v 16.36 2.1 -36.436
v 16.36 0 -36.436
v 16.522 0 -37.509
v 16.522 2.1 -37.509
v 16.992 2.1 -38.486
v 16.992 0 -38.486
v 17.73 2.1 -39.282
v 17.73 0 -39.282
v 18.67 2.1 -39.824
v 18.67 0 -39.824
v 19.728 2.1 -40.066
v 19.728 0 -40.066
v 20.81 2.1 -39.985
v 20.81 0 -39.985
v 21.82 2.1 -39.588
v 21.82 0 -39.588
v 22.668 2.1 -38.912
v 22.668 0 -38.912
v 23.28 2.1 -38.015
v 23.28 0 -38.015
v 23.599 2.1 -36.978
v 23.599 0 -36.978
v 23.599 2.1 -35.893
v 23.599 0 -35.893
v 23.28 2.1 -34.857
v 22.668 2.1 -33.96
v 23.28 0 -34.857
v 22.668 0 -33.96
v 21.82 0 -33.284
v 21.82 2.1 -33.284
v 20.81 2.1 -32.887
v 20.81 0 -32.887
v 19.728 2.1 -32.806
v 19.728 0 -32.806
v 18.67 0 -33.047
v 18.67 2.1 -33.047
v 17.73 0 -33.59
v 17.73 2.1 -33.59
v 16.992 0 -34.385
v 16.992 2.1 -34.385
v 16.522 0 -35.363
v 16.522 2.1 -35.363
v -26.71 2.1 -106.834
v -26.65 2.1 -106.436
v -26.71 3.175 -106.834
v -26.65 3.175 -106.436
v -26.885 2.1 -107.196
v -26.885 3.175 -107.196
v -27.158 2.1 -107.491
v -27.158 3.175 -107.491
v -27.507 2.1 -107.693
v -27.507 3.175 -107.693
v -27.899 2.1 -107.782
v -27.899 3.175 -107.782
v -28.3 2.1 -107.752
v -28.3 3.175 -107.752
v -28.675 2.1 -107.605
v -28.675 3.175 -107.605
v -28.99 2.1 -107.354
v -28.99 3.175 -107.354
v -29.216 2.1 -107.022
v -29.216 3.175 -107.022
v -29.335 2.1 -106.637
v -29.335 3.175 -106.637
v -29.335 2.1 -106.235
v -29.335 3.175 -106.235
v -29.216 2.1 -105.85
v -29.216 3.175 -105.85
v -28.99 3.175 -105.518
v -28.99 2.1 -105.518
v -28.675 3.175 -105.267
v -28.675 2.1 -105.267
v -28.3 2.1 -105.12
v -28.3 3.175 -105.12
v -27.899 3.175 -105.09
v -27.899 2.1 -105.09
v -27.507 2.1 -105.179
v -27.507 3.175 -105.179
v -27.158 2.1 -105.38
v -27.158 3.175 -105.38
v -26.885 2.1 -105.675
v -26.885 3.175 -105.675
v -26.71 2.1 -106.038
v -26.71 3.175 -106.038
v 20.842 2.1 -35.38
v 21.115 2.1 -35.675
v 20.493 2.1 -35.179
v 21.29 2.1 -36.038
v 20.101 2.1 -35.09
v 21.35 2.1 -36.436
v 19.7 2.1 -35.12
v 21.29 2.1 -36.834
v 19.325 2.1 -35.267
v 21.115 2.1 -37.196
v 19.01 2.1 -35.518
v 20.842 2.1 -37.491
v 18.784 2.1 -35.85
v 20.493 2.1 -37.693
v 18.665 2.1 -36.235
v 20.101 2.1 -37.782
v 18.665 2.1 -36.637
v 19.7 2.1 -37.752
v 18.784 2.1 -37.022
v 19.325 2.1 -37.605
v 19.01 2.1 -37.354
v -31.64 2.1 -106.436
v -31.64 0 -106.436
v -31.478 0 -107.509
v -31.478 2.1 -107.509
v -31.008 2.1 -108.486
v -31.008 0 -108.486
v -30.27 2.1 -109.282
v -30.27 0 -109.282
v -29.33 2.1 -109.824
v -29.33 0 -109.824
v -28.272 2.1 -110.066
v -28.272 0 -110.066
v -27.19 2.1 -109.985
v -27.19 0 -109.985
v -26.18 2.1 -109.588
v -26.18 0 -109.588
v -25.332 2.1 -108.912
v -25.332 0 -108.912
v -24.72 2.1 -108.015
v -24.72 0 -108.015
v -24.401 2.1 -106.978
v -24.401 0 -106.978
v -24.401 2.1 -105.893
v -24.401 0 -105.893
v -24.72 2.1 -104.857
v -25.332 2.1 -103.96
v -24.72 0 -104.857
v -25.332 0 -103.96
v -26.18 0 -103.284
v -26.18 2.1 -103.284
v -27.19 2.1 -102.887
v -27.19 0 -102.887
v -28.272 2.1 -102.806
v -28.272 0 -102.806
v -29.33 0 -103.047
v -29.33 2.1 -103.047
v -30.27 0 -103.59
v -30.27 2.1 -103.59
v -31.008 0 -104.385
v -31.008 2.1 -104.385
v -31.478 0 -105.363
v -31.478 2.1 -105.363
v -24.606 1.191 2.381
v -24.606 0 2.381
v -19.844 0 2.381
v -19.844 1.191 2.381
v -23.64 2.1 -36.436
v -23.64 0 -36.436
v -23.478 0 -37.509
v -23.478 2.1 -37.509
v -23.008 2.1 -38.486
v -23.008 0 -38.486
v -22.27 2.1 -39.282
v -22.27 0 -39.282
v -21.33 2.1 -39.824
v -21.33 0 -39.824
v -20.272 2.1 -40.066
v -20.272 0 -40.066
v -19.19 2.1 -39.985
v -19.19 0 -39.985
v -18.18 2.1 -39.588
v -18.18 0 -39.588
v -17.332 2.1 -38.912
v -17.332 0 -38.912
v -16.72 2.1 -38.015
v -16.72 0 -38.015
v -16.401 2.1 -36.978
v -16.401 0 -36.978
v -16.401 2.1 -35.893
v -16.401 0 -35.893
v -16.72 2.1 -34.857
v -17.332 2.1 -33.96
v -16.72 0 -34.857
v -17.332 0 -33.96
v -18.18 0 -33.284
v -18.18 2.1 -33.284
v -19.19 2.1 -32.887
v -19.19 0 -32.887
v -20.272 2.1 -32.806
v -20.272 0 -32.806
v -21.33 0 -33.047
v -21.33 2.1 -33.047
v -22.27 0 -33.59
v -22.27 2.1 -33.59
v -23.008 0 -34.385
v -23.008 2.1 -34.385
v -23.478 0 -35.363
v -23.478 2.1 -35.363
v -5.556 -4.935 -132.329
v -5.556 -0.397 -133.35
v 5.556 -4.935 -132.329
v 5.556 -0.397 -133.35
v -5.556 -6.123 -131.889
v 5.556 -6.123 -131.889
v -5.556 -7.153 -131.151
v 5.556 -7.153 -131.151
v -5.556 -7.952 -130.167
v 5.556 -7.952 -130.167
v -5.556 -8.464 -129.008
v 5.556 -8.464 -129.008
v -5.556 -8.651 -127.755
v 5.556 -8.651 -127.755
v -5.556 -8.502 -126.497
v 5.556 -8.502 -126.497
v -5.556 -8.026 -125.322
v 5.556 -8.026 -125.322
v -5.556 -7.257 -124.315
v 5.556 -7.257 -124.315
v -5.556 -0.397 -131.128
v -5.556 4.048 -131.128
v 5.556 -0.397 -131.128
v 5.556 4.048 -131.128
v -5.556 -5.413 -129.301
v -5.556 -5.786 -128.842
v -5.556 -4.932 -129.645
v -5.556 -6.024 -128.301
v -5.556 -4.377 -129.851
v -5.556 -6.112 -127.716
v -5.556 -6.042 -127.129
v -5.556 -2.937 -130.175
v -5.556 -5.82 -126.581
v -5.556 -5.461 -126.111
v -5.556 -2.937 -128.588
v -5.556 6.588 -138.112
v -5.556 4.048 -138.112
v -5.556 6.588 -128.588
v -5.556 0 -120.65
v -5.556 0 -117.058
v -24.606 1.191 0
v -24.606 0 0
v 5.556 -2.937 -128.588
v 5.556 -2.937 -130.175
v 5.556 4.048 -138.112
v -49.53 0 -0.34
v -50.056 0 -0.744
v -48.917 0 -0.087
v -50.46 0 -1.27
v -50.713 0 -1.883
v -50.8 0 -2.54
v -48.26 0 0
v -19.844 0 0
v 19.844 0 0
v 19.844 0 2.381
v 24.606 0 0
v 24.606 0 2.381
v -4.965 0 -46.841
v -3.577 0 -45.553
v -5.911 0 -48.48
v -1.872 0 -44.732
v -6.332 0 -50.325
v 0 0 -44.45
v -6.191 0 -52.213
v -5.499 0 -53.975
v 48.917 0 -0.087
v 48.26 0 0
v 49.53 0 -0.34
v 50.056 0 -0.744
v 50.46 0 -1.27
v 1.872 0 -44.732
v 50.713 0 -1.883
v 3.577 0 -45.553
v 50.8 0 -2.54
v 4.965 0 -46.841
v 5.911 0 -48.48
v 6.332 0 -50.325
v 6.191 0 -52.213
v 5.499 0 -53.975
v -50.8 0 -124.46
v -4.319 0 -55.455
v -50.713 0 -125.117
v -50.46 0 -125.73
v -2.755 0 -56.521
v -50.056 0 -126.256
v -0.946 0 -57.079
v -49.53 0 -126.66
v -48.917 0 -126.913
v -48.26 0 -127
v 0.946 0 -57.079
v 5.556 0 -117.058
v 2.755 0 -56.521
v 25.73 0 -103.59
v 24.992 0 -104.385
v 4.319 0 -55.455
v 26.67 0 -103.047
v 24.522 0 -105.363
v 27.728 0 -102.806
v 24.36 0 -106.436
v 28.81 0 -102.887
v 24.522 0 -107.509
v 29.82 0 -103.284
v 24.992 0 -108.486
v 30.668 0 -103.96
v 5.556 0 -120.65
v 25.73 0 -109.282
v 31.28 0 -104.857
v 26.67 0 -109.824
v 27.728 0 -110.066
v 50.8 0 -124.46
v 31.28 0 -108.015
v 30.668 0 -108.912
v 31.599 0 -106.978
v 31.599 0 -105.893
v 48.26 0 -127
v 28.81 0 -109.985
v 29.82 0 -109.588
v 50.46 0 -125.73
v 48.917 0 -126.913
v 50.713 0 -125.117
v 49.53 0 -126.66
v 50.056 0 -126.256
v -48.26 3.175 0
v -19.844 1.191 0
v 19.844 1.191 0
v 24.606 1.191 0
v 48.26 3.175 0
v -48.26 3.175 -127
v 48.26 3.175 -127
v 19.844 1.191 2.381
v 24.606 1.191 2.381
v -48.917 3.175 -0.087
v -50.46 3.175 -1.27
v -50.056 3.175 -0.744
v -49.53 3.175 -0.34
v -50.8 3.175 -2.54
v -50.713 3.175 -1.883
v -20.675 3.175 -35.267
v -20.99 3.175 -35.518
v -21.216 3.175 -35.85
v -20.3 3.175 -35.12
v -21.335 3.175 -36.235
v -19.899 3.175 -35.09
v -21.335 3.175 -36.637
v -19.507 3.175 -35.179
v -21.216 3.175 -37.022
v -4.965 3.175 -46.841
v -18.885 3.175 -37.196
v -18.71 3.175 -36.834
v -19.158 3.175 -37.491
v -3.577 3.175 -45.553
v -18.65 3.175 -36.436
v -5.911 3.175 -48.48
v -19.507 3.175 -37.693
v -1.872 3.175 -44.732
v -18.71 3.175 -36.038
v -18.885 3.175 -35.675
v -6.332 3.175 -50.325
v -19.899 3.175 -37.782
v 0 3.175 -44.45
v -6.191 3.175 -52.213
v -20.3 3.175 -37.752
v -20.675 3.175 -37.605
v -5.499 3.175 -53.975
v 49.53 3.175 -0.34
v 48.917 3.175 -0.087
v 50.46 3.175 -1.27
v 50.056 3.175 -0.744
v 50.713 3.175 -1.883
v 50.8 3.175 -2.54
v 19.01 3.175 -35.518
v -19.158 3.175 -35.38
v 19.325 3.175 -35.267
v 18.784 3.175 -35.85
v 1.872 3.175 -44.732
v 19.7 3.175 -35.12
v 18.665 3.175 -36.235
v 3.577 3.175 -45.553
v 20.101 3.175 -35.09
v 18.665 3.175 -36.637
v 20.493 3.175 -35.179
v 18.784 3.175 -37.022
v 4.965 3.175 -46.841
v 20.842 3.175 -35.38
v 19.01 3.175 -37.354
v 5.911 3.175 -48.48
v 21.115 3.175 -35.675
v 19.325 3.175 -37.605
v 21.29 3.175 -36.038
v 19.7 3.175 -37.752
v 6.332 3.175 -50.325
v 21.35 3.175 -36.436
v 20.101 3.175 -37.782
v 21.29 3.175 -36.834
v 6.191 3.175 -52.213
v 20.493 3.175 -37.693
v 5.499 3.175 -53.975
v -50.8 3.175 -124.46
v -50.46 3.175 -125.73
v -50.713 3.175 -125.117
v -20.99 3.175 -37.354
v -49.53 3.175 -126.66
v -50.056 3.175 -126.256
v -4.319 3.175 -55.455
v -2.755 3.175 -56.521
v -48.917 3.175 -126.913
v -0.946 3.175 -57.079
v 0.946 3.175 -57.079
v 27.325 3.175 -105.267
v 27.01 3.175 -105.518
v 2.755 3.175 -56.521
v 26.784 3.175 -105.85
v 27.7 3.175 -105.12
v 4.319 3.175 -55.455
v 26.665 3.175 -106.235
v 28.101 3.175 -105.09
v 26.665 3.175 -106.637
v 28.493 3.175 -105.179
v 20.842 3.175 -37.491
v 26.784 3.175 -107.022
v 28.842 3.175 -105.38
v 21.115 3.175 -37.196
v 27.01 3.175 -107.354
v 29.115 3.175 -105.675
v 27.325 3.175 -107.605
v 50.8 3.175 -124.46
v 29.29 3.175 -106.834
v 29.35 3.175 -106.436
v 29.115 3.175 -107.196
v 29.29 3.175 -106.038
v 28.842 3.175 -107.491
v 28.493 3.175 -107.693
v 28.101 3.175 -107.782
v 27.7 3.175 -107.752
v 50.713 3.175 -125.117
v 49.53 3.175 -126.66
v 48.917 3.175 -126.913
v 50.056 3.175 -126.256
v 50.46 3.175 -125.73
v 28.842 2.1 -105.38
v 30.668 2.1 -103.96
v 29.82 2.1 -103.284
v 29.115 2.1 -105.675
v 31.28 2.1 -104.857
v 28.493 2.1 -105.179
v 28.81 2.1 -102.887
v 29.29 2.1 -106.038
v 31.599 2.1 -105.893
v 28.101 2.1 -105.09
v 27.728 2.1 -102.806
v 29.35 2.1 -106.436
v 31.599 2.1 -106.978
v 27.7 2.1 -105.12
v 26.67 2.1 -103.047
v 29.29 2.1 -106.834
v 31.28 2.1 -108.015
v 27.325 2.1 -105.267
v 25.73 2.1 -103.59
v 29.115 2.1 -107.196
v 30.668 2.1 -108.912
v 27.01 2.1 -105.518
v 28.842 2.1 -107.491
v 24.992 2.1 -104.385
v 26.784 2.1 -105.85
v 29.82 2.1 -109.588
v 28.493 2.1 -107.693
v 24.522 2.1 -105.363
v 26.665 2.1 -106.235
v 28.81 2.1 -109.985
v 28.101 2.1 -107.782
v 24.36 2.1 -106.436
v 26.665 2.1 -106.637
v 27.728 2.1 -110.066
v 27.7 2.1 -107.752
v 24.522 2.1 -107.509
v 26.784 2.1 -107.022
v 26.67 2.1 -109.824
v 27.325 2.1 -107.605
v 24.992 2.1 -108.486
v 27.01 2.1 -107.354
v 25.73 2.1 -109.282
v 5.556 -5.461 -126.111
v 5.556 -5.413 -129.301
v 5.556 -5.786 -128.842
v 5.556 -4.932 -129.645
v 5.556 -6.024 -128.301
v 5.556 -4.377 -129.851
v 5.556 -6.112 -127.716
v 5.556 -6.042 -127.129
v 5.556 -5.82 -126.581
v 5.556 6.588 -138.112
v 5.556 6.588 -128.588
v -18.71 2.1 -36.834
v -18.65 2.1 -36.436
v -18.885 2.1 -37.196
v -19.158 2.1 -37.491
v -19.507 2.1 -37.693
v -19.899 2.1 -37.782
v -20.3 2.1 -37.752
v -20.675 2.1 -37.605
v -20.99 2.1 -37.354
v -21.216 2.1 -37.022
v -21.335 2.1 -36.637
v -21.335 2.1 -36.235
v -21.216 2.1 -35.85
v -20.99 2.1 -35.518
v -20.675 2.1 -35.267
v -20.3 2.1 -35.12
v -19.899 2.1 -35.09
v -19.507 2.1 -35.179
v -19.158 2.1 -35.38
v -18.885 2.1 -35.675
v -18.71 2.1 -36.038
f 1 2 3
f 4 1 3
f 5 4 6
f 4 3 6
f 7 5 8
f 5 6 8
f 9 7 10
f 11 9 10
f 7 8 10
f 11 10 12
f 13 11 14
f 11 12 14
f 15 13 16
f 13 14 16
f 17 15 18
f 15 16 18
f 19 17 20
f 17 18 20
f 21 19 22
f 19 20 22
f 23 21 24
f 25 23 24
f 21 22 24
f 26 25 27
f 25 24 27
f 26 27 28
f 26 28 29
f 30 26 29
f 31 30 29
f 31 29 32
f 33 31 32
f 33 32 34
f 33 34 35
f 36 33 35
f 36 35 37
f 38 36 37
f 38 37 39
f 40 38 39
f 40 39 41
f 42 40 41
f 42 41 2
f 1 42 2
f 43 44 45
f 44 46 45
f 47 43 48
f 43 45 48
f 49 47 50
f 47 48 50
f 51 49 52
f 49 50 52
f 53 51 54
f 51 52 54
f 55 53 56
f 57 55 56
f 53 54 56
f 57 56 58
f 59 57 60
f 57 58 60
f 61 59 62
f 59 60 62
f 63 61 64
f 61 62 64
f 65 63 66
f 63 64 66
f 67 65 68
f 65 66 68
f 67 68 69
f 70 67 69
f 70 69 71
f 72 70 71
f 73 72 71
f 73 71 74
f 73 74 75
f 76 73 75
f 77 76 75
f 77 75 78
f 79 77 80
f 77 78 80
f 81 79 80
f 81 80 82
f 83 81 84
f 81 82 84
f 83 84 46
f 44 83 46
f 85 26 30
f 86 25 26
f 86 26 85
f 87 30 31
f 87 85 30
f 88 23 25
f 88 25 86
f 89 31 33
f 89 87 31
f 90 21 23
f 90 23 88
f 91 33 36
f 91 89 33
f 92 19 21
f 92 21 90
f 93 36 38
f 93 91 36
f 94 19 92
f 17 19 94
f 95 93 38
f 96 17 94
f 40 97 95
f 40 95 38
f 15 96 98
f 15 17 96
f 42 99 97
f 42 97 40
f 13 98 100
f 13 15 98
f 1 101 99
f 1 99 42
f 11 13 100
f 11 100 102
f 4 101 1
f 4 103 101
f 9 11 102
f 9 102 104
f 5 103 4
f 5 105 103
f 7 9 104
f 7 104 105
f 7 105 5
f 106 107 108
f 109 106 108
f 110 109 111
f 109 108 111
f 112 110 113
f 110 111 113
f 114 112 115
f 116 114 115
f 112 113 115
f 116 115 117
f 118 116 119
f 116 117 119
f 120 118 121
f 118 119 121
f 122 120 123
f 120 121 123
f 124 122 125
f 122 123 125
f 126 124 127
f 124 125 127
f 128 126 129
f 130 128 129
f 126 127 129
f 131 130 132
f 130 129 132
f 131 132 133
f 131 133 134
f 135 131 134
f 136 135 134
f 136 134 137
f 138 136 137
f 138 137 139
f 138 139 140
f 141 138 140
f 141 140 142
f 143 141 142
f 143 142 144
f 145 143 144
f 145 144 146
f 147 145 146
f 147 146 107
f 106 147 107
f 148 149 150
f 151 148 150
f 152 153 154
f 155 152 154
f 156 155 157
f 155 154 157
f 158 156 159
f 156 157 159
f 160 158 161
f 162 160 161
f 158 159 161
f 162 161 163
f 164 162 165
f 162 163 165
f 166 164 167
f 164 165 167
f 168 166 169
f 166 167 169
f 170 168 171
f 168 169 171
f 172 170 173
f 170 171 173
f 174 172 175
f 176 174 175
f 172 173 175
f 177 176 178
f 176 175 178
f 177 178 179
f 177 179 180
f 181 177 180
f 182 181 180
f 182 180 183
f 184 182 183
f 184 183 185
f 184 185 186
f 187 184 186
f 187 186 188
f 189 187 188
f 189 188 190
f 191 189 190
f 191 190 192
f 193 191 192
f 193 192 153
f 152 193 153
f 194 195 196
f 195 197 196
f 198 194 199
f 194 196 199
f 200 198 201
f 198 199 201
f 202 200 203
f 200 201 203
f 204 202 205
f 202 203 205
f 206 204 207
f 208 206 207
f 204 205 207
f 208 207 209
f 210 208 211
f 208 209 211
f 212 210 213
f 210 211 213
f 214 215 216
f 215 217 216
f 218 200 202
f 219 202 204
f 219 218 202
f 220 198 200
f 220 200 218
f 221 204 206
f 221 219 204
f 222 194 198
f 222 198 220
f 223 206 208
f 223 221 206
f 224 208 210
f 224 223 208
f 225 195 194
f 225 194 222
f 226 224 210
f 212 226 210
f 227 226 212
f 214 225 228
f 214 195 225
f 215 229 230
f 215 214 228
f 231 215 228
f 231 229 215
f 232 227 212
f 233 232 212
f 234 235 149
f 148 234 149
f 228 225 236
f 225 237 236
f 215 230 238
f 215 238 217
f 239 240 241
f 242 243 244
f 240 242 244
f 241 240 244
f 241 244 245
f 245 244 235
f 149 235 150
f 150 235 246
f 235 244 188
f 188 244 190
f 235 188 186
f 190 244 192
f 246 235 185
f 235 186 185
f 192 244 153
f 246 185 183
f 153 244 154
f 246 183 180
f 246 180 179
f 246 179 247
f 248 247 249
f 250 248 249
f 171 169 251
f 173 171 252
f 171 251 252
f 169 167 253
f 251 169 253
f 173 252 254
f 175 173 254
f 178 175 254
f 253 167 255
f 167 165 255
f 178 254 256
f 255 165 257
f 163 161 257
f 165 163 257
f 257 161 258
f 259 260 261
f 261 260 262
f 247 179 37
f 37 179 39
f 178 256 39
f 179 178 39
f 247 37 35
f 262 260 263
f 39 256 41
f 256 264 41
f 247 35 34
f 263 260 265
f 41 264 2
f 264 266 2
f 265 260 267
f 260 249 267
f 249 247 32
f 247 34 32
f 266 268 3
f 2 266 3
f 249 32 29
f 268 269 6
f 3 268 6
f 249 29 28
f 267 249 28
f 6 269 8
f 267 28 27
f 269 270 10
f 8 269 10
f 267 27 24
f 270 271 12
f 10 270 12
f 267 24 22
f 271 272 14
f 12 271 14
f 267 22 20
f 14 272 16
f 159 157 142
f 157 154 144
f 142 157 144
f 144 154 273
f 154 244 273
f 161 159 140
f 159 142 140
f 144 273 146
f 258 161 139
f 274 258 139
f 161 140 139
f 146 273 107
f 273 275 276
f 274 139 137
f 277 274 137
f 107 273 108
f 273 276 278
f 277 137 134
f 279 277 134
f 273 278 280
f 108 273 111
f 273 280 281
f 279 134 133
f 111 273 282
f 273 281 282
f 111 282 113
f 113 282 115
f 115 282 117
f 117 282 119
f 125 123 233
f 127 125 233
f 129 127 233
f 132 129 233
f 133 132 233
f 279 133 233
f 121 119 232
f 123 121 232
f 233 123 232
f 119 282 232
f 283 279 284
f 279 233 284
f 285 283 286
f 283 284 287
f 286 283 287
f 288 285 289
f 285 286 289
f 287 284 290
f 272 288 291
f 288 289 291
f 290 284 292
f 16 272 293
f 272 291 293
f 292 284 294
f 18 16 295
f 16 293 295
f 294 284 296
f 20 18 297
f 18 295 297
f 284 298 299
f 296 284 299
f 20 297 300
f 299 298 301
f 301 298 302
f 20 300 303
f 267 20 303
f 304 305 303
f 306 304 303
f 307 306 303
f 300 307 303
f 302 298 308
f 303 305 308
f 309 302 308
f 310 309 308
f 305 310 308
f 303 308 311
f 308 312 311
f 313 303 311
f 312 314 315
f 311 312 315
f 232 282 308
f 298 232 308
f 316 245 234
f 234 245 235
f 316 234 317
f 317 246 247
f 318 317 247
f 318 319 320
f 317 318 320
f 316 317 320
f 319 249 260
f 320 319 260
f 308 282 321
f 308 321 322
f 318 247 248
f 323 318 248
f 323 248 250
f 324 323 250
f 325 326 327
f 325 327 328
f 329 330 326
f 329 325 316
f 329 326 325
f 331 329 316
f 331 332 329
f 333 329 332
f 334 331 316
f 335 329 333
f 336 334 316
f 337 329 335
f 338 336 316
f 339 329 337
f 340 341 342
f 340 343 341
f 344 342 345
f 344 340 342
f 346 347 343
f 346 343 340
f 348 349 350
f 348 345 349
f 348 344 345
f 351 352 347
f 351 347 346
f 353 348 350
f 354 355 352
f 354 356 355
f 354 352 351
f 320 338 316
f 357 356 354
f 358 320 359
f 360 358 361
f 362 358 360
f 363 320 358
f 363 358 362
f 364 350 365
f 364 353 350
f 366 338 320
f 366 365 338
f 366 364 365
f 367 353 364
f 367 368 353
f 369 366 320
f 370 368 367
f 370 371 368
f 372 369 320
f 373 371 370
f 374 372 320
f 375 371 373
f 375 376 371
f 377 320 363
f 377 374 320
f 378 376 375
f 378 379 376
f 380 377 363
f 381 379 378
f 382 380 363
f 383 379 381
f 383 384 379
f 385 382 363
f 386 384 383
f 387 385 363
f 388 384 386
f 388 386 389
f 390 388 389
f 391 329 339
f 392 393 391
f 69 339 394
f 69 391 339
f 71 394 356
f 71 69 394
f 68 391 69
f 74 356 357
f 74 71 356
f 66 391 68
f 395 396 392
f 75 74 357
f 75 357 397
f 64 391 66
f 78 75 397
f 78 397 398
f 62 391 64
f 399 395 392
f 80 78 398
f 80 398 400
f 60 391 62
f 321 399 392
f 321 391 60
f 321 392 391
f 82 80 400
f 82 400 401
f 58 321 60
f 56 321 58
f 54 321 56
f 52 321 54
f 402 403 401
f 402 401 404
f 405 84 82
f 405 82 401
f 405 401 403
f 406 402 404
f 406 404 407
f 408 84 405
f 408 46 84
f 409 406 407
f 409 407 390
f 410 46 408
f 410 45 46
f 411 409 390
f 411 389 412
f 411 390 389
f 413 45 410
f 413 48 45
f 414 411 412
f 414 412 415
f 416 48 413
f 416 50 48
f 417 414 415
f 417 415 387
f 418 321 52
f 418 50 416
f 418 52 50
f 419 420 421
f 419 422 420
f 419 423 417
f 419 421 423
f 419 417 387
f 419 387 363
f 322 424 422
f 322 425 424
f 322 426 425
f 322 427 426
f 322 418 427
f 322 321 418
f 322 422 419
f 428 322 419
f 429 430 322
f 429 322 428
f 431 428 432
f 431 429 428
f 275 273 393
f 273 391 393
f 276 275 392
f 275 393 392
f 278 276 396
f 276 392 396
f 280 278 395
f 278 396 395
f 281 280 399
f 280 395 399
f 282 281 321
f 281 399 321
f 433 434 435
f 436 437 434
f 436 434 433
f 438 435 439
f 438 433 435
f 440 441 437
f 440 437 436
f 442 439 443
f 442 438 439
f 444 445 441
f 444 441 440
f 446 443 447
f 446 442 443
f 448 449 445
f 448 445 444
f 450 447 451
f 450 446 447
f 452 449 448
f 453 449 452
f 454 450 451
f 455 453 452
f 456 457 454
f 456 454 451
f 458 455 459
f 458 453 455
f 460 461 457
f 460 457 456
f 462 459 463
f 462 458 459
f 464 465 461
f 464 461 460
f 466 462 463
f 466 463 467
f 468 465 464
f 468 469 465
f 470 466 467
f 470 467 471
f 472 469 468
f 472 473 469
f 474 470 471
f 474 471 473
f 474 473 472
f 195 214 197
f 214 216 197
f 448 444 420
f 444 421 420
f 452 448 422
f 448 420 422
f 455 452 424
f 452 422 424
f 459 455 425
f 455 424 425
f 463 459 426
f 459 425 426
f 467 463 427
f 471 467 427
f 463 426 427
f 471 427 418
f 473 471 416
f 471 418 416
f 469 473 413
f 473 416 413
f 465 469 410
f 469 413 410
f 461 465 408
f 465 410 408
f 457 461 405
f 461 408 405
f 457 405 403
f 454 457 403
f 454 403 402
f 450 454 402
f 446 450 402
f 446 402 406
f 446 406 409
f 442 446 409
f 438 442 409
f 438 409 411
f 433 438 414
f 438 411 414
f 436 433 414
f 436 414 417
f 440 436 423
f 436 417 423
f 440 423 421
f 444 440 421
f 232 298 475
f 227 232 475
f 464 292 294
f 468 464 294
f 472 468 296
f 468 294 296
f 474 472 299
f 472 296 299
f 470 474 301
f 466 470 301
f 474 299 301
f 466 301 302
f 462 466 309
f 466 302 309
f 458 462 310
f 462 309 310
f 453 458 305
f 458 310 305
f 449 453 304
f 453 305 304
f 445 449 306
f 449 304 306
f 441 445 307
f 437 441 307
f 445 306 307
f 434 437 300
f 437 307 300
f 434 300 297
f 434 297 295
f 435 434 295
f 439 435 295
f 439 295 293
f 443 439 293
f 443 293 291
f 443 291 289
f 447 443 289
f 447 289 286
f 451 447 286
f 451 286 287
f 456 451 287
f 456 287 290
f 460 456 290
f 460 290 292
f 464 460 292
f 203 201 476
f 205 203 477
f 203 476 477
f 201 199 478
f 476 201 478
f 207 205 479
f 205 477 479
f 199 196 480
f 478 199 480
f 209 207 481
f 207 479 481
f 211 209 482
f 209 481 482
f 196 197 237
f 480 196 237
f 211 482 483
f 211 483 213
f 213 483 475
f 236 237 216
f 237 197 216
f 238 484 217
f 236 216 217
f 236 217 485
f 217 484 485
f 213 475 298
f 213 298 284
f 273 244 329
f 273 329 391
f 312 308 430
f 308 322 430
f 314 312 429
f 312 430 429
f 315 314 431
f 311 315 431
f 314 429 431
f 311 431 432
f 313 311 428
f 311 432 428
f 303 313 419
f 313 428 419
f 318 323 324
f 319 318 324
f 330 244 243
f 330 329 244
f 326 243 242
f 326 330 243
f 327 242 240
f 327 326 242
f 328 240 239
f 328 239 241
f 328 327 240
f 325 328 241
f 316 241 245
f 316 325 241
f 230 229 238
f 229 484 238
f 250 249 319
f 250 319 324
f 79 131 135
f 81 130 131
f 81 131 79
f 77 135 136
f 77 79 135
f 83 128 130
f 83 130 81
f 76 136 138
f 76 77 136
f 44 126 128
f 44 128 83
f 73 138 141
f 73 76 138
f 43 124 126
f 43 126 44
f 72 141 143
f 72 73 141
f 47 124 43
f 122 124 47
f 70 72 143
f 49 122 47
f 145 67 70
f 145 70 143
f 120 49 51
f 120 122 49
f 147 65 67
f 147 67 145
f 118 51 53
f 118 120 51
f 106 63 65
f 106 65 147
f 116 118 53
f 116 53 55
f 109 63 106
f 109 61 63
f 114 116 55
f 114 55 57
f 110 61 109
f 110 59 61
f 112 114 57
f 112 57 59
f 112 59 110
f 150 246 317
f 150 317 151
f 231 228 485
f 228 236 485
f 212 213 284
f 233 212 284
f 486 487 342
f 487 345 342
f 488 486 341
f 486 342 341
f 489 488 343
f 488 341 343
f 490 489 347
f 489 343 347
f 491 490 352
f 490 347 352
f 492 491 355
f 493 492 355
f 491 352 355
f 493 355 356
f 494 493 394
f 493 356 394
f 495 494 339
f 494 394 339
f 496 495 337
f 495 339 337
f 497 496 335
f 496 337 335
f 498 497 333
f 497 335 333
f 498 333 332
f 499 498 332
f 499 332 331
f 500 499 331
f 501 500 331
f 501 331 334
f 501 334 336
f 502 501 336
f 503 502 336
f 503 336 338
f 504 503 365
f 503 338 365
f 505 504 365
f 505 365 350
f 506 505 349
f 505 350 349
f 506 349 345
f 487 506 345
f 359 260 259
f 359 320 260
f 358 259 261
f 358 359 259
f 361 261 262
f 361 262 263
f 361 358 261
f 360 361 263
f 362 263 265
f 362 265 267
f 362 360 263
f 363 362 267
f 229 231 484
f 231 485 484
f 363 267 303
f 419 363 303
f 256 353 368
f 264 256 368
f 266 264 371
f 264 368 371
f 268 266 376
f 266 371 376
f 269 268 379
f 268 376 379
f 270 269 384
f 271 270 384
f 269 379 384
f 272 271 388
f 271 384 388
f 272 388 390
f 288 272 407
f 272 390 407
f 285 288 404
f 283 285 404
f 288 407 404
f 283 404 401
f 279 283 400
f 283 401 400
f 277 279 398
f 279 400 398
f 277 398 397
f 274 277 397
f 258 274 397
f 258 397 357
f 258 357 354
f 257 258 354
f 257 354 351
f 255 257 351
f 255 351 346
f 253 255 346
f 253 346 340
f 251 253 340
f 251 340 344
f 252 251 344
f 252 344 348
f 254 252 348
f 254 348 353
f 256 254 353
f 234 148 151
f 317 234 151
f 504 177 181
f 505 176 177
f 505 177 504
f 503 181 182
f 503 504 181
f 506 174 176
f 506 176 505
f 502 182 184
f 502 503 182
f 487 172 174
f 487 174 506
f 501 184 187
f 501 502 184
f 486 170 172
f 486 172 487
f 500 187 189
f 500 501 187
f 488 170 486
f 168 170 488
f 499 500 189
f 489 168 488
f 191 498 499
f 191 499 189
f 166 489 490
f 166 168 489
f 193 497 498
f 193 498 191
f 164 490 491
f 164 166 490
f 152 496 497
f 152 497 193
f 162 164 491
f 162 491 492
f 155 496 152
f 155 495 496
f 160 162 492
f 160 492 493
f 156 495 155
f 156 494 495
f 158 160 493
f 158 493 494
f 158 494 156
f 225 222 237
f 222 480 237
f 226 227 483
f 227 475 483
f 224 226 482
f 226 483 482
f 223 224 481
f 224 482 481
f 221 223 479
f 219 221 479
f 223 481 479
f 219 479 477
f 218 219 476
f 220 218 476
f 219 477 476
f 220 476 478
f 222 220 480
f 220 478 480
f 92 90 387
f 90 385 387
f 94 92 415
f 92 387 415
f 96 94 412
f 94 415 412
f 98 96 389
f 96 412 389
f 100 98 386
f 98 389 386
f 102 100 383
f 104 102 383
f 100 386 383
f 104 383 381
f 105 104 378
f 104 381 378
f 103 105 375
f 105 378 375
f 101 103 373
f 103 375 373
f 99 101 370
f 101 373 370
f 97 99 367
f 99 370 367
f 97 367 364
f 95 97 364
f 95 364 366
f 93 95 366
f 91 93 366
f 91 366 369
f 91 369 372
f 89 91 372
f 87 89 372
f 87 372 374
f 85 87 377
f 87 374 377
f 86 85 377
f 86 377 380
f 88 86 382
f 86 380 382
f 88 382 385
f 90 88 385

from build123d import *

# Parameters (mm, degrees)
SKETCH1_W                                          = 101.6
SKETCH1_H                                          = 127
BOSS_EXTRUDE1_DEPTH                                = 3.175
SKETCH2_W                                          = 4.7625
SKETCH2_H                                          = 2.38125
BOSS_EXTRUDE2_DEPTH                                = 1.190625
FILLET1_R                                          = 2.54
BOSS_EXTRUDE3_DEPTH                                = 5.55625
CBORE_FOR_M2_5_HEX_HEAD_MACHINE_SCREW1_D           = 2.7
CBORE_FOR_M2_5_HEX_HEAD_MACHINE_SCREW1_CBORE_D     = 7.28
CBORE_FOR_M2_5_HEX_HEAD_MACHINE_SCREW1_CBORE_DEPTH = 2.1
SKETCH8_R                                          = 6.35
CUT_EXTRUDE1_DEPTH                                 = 148.63326429


with BuildPart() as part:
    # Sketch1 → Boss-Extrude1 (new body)
    with BuildSketch(Plane(origin=(0, 0, 0), x_dir=(1, 0, 0), z_dir=(0, 1, 0))):
        with Locations((0, 63.5)):
            Rectangle(SKETCH1_W, SKETCH1_H)
    extrude(amount=BOSS_EXTRUDE1_DEPTH)

    # Sketch2 → Boss-Extrude2 (add)
    with BuildSketch(Plane.XZ):
        with Locations((-22.225, 1.190625)):
            Rectangle(SKETCH2_W, SKETCH2_H)
        with Locations((22.225, 1.190625)):
            Rectangle(SKETCH2_W, SKETCH2_H)
    extrude(amount=-BOSS_EXTRUDE2_DEPTH)

    # Fillet1
    fillet1_edges = [part.edges().sort_by_distance(p)[0] for p in [
        (50.8, 1.5875, 0),
        (-50.8, 1.5875, 0),
        (-50.8, 1.5875, -127),
        (50.8, 1.5875, -127),
    ]]
    fillet(fillet1_edges, radius=FILLET1_R)

    # Sketch4 → Boss-Extrude3 (add, symmetric)
    with BuildSketch(Plane(origin=(0, 0, 0), x_dir=(0, 0, -1), z_dir=(1, 0, 0))):
        with BuildLine():
            Line((120.65, 0), (126.111050725, -5.461050725))
            ThreePointArc((126.111050725, -5.461050725), (128.301155995, -6.024193053), (129.850888229, -4.377371758))
            Line((129.850888229, -4.377371758), (130.175, -2.936875))
            Line((130.175, -2.936875), (128.5875, -2.936875))
            Line((128.5875, -2.936875), (128.5875, 6.588125))
            Line((128.5875, 6.588125), (138.1125, 6.588125))
            Line((138.1125, 6.588125), (138.1125, 4.048125))
            Line((138.1125, 4.048125), (131.1275, 4.048125))
            Line((131.1275, 4.048125), (131.1275, -0.396875))
            Line((131.1275, -0.396875), (133.35, -0.396875))
            Line((133.35, -0.396875), (132.32893701, -4.934932733))
            ThreePointArc((132.32893701, -4.934932733), (129.008082223, -8.463835508), (124.314999501, -7.25710195))
            Line((124.314999501, -7.25710195), (117.057897552, 0))
            Line((117.057897552, 0), (120.65, 0))
        make_face()
    extrude(amount=BOSS_EXTRUDE3_DEPTH, both=True)

    # CBORE for M2.5 Hex Head Machine Screw1 (through all)
    with Locations(Plane(origin=(0, 0, 0), x_dir=(-1, 0, 0), z_dir=(0, -1, 0))):
        with Locations((20, 36.435847812), (28, 106.435847812), (-20, 36.435847812), (-28, 106.435847812)):
            CounterBoreHole(CBORE_FOR_M2_5_HEX_HEAD_MACHINE_SCREW1_D / 2, CBORE_FOR_M2_5_HEX_HEAD_MACHINE_SCREW1_CBORE_D / 2, CBORE_FOR_M2_5_HEX_HEAD_MACHINE_SCREW1_CBORE_DEPTH)

    # Sketch8 → Cut-Extrude1 (cut, through all)
    with BuildSketch(Plane(origin=(0, 3.175, 0), x_dir=(1, 0, 0), z_dir=(0, 1, 0))):
        with Locations(Location((0, 50.8, 0), (0, 0, 270))):
            Circle(SKETCH8_R)
    extrude(amount=-CUT_EXTRUDE1_DEPTH, mode=Mode.SUBTRACT)


solid = part.part
